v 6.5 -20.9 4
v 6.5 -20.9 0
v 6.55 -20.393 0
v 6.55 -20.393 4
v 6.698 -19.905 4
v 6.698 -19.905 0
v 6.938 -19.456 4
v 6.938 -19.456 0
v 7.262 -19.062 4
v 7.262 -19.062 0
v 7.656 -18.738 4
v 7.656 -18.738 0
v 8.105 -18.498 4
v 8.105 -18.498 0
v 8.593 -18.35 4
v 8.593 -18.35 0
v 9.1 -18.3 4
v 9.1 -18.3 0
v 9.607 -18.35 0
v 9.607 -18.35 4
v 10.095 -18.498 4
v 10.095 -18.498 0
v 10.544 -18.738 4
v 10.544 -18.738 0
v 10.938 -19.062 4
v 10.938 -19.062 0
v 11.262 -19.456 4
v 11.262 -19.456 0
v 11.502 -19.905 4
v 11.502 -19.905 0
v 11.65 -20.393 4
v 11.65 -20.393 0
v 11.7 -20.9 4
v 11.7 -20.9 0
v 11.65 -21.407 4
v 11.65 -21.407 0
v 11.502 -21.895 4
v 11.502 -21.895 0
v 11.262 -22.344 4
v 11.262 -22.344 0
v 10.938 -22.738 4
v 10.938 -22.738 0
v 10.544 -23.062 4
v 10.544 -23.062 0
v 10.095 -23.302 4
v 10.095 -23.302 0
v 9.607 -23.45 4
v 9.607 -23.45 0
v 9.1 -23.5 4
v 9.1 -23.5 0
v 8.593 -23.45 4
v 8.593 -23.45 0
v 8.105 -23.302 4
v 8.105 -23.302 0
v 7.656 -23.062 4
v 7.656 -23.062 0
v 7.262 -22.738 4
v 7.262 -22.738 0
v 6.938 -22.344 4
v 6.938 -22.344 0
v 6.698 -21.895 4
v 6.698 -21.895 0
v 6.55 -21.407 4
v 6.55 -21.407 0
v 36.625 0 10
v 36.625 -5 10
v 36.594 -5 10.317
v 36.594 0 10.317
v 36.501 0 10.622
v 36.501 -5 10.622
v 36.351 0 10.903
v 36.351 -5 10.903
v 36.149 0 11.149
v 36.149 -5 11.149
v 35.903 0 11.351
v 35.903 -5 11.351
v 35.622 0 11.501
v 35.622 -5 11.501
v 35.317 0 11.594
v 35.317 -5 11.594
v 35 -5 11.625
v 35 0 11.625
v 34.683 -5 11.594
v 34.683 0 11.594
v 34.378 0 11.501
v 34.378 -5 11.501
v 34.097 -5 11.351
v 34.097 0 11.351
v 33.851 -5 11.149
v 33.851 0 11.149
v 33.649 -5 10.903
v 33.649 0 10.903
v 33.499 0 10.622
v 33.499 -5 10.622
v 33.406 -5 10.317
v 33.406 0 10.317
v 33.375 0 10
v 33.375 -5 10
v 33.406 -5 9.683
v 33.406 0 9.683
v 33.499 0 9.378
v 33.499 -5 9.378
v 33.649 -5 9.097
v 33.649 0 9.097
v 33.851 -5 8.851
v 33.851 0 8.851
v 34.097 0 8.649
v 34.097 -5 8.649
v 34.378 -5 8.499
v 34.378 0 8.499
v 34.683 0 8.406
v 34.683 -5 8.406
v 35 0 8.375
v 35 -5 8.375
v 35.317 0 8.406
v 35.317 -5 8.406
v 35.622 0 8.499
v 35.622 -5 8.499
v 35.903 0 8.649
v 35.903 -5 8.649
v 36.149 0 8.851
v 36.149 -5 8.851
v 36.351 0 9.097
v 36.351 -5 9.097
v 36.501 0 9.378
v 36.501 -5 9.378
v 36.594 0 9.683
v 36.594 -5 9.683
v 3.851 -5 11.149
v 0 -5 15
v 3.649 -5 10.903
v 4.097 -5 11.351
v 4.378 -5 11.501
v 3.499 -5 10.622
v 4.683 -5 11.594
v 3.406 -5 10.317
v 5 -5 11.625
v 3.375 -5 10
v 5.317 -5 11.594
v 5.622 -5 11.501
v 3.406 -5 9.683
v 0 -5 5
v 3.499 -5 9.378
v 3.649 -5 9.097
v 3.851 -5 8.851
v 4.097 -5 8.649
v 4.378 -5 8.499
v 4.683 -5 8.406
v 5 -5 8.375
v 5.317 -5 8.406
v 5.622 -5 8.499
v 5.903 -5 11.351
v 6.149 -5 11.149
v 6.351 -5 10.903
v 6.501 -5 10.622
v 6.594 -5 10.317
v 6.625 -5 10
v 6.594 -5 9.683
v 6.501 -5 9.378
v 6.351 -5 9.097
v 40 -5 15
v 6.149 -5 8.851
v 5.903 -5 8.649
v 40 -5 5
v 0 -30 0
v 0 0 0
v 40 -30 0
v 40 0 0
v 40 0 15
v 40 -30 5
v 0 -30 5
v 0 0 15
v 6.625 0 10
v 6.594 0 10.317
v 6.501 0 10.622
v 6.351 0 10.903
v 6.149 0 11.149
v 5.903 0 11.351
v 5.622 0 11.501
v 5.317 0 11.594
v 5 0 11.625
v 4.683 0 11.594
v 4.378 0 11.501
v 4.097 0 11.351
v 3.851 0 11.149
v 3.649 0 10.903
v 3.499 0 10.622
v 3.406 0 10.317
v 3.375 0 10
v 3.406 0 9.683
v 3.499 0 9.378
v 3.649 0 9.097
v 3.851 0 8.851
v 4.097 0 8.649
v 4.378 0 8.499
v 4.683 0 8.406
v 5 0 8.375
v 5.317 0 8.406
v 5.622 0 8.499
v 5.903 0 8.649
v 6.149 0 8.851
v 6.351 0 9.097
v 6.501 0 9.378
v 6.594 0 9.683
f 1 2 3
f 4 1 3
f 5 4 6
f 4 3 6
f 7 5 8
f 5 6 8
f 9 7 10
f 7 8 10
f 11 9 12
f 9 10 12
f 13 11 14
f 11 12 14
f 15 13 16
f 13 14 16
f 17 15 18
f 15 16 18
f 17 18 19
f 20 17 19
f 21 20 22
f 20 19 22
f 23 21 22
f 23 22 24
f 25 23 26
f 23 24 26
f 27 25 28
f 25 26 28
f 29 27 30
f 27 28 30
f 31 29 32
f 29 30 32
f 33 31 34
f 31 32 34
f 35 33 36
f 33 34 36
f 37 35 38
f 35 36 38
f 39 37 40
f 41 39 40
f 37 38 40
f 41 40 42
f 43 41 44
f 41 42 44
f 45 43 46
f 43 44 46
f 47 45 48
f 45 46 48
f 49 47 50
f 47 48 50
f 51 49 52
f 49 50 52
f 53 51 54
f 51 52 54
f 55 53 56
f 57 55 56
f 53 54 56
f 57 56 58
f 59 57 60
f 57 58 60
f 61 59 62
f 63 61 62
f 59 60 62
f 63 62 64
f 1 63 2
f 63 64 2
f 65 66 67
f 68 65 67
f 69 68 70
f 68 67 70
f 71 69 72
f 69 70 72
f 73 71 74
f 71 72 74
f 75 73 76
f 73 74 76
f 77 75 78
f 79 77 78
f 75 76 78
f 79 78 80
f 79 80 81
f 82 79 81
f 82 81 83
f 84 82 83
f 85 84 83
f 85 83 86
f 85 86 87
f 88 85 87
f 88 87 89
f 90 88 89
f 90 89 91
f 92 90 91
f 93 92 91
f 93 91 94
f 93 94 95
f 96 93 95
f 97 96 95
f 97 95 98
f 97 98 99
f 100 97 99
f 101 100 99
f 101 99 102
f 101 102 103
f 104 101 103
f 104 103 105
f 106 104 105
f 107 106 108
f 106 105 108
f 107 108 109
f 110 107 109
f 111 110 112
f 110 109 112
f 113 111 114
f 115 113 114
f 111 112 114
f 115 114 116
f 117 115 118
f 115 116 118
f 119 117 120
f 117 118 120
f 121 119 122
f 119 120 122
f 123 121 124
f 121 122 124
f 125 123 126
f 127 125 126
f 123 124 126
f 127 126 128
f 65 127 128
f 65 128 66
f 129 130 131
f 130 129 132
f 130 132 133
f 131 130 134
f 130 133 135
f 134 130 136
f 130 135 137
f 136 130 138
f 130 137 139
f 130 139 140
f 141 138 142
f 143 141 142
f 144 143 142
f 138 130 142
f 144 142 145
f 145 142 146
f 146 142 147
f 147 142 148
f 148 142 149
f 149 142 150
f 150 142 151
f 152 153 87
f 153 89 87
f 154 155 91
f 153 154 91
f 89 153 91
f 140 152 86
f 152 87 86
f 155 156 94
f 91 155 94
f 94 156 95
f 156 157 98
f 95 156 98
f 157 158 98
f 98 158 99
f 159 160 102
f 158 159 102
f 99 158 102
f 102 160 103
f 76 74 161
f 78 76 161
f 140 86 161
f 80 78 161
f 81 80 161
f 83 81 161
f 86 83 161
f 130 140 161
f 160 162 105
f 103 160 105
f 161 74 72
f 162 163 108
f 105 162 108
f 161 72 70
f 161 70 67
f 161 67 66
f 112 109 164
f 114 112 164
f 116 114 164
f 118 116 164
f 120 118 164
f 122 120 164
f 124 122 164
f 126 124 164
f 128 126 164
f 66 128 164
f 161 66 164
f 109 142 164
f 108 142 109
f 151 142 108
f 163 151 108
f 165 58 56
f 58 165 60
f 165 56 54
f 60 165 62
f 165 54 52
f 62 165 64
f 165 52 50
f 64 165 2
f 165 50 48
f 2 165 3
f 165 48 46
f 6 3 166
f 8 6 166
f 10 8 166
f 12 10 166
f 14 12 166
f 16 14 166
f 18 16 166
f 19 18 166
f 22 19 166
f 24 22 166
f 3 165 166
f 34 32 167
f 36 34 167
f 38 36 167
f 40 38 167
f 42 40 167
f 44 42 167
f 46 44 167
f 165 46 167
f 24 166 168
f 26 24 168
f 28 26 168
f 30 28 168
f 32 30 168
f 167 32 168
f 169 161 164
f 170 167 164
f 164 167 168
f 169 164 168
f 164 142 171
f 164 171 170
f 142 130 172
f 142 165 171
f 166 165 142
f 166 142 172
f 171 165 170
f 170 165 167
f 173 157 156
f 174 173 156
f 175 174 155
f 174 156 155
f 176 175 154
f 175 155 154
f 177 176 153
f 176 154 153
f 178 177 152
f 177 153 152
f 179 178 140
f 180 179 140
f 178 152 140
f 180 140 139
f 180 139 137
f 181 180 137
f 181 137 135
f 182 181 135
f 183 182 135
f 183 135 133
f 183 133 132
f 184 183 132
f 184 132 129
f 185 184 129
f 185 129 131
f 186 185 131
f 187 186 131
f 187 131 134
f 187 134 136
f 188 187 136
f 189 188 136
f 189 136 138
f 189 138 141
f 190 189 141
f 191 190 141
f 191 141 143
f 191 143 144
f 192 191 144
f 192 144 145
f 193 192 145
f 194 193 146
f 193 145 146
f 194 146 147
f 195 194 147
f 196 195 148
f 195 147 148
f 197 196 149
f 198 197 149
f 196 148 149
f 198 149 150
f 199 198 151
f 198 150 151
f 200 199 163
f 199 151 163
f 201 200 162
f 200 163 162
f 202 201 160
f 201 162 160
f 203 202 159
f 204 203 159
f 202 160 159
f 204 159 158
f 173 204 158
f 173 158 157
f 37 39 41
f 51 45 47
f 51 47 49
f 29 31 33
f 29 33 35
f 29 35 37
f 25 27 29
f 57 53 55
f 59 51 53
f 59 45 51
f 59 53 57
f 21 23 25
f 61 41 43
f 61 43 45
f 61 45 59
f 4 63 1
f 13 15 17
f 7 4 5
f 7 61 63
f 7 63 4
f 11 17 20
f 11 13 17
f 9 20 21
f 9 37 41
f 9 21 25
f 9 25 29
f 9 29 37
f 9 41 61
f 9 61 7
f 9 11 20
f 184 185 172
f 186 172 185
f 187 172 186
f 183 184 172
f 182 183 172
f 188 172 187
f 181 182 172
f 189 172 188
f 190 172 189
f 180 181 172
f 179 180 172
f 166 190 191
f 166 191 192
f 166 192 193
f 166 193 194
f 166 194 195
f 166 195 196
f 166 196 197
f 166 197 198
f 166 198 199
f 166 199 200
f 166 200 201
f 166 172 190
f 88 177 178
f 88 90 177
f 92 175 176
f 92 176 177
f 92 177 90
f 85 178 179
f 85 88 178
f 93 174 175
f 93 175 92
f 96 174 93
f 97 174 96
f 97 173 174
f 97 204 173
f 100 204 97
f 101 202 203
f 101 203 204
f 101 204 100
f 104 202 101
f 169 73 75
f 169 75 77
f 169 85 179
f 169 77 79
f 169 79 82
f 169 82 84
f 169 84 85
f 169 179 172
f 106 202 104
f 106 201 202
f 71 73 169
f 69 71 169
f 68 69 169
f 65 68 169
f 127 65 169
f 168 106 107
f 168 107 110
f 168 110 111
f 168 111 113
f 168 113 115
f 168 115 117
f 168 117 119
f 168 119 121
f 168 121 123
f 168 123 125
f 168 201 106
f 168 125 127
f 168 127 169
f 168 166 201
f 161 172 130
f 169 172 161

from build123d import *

# Parameters (mm, degrees)
ESQUISSE1_W             = 40
ESQUISSE1_H             = 30
BOSS_EXTRU_1_DEPTH      = 5
ESQUISSE2_W             = 40
ESQUISSE2_H             = 5
BOSS_EXTRU_2_DEPTH      = 10
ESQUISSE3_R             = 1.625
ENL_V_MAT_EXTRU_1_DEPTH = 6
ESQUISSE4_R             = 2.6
ENL_V_MAT_EXTRU_2_DEPTH = 4


with BuildPart() as part:
    # Esquisse1 → Boss.-Extru.1 (new body)
    with BuildSketch(Plane.XY):
        with Locations((20, -15)):
            Rectangle(ESQUISSE1_W, ESQUISSE1_H)
    extrude(amount=BOSS_EXTRU_1_DEPTH)

    # Esquisse2 → Boss.-Extru.2 (add)
    with BuildSketch(Plane.XY.offset(5)):
        with Locations((20, -2.5)):
            Rectangle(ESQUISSE2_W, ESQUISSE2_H)
    extrude(amount=BOSS_EXTRU_2_DEPTH)

    # Esquisse3 → Enlèv. mat.-Extru.1 (cut, through all)
    with BuildSketch(Plane.XZ.offset(5)):
        with Locations((5, 10)):
            Circle(ESQUISSE3_R)
        with Locations((35, 10)):
            Circle(ESQUISSE3_R)
    extrude(amount=-ENL_V_MAT_EXTRU_1_DEPTH, mode=Mode.SUBTRACT)

    # Esquisse4 → Enlèv. mat.-Extru.2 (cut)
    with BuildSketch(Plane(origin=(0, 0, 0), x_dir=(-1, 0, 0), z_dir=(0, 0, -1))):
        with Locations((-9.1, -20.9)):
            Circle(ESQUISSE4_R)
    extrude(amount=-ENL_V_MAT_EXTRU_2_DEPTH, mode=Mode.SUBTRACT)


solid = part.part
